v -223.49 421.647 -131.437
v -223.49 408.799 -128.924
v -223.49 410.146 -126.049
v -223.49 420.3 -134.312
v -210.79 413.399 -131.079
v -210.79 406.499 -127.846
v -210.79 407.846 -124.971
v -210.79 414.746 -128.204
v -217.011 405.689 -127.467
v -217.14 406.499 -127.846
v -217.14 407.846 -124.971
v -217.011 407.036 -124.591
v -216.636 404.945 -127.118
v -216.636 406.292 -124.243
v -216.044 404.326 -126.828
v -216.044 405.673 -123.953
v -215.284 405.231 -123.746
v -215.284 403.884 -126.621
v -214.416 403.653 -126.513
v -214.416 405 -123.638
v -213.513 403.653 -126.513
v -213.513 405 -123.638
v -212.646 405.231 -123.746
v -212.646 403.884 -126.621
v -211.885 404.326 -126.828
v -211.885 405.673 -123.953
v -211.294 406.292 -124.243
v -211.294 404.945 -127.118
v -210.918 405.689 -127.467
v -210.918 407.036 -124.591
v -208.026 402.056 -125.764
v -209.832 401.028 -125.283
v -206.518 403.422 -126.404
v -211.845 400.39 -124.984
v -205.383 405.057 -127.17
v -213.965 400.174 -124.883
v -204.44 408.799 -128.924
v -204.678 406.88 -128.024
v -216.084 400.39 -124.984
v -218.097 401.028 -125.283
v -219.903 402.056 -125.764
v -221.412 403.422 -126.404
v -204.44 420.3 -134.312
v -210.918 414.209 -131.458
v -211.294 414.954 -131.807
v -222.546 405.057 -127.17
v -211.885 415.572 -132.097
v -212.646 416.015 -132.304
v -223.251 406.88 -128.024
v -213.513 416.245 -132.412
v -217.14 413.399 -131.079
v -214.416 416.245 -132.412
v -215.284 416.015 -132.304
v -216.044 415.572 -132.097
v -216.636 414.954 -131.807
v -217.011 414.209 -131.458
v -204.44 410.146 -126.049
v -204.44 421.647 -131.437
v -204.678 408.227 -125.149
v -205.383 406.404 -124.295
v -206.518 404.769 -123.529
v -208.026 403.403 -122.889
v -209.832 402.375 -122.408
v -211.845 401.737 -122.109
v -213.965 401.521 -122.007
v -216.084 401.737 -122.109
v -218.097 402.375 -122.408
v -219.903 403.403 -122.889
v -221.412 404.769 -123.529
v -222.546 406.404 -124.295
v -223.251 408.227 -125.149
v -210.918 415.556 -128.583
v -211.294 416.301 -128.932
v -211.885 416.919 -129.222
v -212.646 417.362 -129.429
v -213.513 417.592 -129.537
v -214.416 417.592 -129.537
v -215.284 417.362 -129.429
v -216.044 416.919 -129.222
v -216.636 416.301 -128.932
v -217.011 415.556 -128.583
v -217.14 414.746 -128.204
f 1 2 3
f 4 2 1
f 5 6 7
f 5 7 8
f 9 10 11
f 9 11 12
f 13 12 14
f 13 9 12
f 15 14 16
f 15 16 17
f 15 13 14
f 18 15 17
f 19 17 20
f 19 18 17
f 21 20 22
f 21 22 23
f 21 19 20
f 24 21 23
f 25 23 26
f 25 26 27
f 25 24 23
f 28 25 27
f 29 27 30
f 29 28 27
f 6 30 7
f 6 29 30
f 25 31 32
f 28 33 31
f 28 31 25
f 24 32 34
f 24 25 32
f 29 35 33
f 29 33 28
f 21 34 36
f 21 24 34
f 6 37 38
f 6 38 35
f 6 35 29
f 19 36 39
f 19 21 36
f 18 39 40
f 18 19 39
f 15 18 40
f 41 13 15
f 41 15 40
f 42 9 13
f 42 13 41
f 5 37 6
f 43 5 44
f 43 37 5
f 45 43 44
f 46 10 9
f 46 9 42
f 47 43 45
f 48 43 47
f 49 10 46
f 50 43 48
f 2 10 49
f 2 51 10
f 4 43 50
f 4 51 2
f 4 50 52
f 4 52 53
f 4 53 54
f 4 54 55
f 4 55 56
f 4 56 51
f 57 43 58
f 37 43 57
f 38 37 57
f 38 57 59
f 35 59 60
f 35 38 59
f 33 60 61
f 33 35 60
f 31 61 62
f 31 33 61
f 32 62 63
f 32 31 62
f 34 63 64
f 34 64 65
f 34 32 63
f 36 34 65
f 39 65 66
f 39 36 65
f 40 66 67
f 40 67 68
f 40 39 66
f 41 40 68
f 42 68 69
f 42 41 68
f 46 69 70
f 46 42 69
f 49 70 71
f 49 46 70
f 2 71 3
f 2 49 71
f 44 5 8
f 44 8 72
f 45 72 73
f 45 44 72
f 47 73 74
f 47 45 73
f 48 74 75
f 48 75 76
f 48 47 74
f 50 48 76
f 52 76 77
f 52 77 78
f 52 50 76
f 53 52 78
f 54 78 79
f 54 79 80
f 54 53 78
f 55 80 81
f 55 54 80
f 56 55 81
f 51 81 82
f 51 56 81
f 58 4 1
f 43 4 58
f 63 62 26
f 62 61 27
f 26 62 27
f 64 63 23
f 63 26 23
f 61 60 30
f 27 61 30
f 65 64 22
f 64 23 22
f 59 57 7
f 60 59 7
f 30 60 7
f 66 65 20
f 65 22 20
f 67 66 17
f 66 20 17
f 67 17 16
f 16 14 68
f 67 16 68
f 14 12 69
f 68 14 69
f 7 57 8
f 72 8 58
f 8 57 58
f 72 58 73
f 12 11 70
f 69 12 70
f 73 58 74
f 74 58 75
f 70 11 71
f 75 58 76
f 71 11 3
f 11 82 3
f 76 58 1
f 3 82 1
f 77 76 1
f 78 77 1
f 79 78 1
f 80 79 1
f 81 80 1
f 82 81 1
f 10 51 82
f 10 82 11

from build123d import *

# Parameters (mm, degrees)
BOSS_EXTRUDE1_DEPTH = 3.175


with BuildPart() as part:
    # Sketch1 → Boss-Extrude1 (new body)
    with BuildSketch(Plane(origin=(0, 24.05298106, 51.338092747), x_dir=(1, 0, 0), z_dir=(0, 0.42426395071815903, 0.9055385690963249))):
        with BuildLine():
            Line((-223.489586571, 437.581228051), (-204.439586571, 437.581228051))
            Line((-204.439586571, 437.581228051), (-204.439586571, 424.881228051))
            ThreePointArc((-204.439586571, 424.881228051), (-213.964586571, 415.356228051), (-223.489586571, 424.881228051))
            Line((-223.489586571, 424.881228051), (-223.489586571, 437.581228051))
        make_face()
        with BuildLine():
            Line((-210.789586571, 422.341228051), (-210.789586571, 429.961228051))
            ThreePointArc((-210.789586571, 429.961228051), (-213.964586571, 433.136228051), (-217.139586571, 429.961228051))
            Line((-217.139586571, 429.961228051), (-217.139586571, 422.341228051))
            ThreePointArc((-217.139586571, 422.341228051), (-213.964586571, 419.166228051), (-210.789586571, 422.341228051))
        make_face(mode=Mode.SUBTRACT)
    extrude(amount=BOSS_EXTRUDE1_DEPTH)


solid = part.part
